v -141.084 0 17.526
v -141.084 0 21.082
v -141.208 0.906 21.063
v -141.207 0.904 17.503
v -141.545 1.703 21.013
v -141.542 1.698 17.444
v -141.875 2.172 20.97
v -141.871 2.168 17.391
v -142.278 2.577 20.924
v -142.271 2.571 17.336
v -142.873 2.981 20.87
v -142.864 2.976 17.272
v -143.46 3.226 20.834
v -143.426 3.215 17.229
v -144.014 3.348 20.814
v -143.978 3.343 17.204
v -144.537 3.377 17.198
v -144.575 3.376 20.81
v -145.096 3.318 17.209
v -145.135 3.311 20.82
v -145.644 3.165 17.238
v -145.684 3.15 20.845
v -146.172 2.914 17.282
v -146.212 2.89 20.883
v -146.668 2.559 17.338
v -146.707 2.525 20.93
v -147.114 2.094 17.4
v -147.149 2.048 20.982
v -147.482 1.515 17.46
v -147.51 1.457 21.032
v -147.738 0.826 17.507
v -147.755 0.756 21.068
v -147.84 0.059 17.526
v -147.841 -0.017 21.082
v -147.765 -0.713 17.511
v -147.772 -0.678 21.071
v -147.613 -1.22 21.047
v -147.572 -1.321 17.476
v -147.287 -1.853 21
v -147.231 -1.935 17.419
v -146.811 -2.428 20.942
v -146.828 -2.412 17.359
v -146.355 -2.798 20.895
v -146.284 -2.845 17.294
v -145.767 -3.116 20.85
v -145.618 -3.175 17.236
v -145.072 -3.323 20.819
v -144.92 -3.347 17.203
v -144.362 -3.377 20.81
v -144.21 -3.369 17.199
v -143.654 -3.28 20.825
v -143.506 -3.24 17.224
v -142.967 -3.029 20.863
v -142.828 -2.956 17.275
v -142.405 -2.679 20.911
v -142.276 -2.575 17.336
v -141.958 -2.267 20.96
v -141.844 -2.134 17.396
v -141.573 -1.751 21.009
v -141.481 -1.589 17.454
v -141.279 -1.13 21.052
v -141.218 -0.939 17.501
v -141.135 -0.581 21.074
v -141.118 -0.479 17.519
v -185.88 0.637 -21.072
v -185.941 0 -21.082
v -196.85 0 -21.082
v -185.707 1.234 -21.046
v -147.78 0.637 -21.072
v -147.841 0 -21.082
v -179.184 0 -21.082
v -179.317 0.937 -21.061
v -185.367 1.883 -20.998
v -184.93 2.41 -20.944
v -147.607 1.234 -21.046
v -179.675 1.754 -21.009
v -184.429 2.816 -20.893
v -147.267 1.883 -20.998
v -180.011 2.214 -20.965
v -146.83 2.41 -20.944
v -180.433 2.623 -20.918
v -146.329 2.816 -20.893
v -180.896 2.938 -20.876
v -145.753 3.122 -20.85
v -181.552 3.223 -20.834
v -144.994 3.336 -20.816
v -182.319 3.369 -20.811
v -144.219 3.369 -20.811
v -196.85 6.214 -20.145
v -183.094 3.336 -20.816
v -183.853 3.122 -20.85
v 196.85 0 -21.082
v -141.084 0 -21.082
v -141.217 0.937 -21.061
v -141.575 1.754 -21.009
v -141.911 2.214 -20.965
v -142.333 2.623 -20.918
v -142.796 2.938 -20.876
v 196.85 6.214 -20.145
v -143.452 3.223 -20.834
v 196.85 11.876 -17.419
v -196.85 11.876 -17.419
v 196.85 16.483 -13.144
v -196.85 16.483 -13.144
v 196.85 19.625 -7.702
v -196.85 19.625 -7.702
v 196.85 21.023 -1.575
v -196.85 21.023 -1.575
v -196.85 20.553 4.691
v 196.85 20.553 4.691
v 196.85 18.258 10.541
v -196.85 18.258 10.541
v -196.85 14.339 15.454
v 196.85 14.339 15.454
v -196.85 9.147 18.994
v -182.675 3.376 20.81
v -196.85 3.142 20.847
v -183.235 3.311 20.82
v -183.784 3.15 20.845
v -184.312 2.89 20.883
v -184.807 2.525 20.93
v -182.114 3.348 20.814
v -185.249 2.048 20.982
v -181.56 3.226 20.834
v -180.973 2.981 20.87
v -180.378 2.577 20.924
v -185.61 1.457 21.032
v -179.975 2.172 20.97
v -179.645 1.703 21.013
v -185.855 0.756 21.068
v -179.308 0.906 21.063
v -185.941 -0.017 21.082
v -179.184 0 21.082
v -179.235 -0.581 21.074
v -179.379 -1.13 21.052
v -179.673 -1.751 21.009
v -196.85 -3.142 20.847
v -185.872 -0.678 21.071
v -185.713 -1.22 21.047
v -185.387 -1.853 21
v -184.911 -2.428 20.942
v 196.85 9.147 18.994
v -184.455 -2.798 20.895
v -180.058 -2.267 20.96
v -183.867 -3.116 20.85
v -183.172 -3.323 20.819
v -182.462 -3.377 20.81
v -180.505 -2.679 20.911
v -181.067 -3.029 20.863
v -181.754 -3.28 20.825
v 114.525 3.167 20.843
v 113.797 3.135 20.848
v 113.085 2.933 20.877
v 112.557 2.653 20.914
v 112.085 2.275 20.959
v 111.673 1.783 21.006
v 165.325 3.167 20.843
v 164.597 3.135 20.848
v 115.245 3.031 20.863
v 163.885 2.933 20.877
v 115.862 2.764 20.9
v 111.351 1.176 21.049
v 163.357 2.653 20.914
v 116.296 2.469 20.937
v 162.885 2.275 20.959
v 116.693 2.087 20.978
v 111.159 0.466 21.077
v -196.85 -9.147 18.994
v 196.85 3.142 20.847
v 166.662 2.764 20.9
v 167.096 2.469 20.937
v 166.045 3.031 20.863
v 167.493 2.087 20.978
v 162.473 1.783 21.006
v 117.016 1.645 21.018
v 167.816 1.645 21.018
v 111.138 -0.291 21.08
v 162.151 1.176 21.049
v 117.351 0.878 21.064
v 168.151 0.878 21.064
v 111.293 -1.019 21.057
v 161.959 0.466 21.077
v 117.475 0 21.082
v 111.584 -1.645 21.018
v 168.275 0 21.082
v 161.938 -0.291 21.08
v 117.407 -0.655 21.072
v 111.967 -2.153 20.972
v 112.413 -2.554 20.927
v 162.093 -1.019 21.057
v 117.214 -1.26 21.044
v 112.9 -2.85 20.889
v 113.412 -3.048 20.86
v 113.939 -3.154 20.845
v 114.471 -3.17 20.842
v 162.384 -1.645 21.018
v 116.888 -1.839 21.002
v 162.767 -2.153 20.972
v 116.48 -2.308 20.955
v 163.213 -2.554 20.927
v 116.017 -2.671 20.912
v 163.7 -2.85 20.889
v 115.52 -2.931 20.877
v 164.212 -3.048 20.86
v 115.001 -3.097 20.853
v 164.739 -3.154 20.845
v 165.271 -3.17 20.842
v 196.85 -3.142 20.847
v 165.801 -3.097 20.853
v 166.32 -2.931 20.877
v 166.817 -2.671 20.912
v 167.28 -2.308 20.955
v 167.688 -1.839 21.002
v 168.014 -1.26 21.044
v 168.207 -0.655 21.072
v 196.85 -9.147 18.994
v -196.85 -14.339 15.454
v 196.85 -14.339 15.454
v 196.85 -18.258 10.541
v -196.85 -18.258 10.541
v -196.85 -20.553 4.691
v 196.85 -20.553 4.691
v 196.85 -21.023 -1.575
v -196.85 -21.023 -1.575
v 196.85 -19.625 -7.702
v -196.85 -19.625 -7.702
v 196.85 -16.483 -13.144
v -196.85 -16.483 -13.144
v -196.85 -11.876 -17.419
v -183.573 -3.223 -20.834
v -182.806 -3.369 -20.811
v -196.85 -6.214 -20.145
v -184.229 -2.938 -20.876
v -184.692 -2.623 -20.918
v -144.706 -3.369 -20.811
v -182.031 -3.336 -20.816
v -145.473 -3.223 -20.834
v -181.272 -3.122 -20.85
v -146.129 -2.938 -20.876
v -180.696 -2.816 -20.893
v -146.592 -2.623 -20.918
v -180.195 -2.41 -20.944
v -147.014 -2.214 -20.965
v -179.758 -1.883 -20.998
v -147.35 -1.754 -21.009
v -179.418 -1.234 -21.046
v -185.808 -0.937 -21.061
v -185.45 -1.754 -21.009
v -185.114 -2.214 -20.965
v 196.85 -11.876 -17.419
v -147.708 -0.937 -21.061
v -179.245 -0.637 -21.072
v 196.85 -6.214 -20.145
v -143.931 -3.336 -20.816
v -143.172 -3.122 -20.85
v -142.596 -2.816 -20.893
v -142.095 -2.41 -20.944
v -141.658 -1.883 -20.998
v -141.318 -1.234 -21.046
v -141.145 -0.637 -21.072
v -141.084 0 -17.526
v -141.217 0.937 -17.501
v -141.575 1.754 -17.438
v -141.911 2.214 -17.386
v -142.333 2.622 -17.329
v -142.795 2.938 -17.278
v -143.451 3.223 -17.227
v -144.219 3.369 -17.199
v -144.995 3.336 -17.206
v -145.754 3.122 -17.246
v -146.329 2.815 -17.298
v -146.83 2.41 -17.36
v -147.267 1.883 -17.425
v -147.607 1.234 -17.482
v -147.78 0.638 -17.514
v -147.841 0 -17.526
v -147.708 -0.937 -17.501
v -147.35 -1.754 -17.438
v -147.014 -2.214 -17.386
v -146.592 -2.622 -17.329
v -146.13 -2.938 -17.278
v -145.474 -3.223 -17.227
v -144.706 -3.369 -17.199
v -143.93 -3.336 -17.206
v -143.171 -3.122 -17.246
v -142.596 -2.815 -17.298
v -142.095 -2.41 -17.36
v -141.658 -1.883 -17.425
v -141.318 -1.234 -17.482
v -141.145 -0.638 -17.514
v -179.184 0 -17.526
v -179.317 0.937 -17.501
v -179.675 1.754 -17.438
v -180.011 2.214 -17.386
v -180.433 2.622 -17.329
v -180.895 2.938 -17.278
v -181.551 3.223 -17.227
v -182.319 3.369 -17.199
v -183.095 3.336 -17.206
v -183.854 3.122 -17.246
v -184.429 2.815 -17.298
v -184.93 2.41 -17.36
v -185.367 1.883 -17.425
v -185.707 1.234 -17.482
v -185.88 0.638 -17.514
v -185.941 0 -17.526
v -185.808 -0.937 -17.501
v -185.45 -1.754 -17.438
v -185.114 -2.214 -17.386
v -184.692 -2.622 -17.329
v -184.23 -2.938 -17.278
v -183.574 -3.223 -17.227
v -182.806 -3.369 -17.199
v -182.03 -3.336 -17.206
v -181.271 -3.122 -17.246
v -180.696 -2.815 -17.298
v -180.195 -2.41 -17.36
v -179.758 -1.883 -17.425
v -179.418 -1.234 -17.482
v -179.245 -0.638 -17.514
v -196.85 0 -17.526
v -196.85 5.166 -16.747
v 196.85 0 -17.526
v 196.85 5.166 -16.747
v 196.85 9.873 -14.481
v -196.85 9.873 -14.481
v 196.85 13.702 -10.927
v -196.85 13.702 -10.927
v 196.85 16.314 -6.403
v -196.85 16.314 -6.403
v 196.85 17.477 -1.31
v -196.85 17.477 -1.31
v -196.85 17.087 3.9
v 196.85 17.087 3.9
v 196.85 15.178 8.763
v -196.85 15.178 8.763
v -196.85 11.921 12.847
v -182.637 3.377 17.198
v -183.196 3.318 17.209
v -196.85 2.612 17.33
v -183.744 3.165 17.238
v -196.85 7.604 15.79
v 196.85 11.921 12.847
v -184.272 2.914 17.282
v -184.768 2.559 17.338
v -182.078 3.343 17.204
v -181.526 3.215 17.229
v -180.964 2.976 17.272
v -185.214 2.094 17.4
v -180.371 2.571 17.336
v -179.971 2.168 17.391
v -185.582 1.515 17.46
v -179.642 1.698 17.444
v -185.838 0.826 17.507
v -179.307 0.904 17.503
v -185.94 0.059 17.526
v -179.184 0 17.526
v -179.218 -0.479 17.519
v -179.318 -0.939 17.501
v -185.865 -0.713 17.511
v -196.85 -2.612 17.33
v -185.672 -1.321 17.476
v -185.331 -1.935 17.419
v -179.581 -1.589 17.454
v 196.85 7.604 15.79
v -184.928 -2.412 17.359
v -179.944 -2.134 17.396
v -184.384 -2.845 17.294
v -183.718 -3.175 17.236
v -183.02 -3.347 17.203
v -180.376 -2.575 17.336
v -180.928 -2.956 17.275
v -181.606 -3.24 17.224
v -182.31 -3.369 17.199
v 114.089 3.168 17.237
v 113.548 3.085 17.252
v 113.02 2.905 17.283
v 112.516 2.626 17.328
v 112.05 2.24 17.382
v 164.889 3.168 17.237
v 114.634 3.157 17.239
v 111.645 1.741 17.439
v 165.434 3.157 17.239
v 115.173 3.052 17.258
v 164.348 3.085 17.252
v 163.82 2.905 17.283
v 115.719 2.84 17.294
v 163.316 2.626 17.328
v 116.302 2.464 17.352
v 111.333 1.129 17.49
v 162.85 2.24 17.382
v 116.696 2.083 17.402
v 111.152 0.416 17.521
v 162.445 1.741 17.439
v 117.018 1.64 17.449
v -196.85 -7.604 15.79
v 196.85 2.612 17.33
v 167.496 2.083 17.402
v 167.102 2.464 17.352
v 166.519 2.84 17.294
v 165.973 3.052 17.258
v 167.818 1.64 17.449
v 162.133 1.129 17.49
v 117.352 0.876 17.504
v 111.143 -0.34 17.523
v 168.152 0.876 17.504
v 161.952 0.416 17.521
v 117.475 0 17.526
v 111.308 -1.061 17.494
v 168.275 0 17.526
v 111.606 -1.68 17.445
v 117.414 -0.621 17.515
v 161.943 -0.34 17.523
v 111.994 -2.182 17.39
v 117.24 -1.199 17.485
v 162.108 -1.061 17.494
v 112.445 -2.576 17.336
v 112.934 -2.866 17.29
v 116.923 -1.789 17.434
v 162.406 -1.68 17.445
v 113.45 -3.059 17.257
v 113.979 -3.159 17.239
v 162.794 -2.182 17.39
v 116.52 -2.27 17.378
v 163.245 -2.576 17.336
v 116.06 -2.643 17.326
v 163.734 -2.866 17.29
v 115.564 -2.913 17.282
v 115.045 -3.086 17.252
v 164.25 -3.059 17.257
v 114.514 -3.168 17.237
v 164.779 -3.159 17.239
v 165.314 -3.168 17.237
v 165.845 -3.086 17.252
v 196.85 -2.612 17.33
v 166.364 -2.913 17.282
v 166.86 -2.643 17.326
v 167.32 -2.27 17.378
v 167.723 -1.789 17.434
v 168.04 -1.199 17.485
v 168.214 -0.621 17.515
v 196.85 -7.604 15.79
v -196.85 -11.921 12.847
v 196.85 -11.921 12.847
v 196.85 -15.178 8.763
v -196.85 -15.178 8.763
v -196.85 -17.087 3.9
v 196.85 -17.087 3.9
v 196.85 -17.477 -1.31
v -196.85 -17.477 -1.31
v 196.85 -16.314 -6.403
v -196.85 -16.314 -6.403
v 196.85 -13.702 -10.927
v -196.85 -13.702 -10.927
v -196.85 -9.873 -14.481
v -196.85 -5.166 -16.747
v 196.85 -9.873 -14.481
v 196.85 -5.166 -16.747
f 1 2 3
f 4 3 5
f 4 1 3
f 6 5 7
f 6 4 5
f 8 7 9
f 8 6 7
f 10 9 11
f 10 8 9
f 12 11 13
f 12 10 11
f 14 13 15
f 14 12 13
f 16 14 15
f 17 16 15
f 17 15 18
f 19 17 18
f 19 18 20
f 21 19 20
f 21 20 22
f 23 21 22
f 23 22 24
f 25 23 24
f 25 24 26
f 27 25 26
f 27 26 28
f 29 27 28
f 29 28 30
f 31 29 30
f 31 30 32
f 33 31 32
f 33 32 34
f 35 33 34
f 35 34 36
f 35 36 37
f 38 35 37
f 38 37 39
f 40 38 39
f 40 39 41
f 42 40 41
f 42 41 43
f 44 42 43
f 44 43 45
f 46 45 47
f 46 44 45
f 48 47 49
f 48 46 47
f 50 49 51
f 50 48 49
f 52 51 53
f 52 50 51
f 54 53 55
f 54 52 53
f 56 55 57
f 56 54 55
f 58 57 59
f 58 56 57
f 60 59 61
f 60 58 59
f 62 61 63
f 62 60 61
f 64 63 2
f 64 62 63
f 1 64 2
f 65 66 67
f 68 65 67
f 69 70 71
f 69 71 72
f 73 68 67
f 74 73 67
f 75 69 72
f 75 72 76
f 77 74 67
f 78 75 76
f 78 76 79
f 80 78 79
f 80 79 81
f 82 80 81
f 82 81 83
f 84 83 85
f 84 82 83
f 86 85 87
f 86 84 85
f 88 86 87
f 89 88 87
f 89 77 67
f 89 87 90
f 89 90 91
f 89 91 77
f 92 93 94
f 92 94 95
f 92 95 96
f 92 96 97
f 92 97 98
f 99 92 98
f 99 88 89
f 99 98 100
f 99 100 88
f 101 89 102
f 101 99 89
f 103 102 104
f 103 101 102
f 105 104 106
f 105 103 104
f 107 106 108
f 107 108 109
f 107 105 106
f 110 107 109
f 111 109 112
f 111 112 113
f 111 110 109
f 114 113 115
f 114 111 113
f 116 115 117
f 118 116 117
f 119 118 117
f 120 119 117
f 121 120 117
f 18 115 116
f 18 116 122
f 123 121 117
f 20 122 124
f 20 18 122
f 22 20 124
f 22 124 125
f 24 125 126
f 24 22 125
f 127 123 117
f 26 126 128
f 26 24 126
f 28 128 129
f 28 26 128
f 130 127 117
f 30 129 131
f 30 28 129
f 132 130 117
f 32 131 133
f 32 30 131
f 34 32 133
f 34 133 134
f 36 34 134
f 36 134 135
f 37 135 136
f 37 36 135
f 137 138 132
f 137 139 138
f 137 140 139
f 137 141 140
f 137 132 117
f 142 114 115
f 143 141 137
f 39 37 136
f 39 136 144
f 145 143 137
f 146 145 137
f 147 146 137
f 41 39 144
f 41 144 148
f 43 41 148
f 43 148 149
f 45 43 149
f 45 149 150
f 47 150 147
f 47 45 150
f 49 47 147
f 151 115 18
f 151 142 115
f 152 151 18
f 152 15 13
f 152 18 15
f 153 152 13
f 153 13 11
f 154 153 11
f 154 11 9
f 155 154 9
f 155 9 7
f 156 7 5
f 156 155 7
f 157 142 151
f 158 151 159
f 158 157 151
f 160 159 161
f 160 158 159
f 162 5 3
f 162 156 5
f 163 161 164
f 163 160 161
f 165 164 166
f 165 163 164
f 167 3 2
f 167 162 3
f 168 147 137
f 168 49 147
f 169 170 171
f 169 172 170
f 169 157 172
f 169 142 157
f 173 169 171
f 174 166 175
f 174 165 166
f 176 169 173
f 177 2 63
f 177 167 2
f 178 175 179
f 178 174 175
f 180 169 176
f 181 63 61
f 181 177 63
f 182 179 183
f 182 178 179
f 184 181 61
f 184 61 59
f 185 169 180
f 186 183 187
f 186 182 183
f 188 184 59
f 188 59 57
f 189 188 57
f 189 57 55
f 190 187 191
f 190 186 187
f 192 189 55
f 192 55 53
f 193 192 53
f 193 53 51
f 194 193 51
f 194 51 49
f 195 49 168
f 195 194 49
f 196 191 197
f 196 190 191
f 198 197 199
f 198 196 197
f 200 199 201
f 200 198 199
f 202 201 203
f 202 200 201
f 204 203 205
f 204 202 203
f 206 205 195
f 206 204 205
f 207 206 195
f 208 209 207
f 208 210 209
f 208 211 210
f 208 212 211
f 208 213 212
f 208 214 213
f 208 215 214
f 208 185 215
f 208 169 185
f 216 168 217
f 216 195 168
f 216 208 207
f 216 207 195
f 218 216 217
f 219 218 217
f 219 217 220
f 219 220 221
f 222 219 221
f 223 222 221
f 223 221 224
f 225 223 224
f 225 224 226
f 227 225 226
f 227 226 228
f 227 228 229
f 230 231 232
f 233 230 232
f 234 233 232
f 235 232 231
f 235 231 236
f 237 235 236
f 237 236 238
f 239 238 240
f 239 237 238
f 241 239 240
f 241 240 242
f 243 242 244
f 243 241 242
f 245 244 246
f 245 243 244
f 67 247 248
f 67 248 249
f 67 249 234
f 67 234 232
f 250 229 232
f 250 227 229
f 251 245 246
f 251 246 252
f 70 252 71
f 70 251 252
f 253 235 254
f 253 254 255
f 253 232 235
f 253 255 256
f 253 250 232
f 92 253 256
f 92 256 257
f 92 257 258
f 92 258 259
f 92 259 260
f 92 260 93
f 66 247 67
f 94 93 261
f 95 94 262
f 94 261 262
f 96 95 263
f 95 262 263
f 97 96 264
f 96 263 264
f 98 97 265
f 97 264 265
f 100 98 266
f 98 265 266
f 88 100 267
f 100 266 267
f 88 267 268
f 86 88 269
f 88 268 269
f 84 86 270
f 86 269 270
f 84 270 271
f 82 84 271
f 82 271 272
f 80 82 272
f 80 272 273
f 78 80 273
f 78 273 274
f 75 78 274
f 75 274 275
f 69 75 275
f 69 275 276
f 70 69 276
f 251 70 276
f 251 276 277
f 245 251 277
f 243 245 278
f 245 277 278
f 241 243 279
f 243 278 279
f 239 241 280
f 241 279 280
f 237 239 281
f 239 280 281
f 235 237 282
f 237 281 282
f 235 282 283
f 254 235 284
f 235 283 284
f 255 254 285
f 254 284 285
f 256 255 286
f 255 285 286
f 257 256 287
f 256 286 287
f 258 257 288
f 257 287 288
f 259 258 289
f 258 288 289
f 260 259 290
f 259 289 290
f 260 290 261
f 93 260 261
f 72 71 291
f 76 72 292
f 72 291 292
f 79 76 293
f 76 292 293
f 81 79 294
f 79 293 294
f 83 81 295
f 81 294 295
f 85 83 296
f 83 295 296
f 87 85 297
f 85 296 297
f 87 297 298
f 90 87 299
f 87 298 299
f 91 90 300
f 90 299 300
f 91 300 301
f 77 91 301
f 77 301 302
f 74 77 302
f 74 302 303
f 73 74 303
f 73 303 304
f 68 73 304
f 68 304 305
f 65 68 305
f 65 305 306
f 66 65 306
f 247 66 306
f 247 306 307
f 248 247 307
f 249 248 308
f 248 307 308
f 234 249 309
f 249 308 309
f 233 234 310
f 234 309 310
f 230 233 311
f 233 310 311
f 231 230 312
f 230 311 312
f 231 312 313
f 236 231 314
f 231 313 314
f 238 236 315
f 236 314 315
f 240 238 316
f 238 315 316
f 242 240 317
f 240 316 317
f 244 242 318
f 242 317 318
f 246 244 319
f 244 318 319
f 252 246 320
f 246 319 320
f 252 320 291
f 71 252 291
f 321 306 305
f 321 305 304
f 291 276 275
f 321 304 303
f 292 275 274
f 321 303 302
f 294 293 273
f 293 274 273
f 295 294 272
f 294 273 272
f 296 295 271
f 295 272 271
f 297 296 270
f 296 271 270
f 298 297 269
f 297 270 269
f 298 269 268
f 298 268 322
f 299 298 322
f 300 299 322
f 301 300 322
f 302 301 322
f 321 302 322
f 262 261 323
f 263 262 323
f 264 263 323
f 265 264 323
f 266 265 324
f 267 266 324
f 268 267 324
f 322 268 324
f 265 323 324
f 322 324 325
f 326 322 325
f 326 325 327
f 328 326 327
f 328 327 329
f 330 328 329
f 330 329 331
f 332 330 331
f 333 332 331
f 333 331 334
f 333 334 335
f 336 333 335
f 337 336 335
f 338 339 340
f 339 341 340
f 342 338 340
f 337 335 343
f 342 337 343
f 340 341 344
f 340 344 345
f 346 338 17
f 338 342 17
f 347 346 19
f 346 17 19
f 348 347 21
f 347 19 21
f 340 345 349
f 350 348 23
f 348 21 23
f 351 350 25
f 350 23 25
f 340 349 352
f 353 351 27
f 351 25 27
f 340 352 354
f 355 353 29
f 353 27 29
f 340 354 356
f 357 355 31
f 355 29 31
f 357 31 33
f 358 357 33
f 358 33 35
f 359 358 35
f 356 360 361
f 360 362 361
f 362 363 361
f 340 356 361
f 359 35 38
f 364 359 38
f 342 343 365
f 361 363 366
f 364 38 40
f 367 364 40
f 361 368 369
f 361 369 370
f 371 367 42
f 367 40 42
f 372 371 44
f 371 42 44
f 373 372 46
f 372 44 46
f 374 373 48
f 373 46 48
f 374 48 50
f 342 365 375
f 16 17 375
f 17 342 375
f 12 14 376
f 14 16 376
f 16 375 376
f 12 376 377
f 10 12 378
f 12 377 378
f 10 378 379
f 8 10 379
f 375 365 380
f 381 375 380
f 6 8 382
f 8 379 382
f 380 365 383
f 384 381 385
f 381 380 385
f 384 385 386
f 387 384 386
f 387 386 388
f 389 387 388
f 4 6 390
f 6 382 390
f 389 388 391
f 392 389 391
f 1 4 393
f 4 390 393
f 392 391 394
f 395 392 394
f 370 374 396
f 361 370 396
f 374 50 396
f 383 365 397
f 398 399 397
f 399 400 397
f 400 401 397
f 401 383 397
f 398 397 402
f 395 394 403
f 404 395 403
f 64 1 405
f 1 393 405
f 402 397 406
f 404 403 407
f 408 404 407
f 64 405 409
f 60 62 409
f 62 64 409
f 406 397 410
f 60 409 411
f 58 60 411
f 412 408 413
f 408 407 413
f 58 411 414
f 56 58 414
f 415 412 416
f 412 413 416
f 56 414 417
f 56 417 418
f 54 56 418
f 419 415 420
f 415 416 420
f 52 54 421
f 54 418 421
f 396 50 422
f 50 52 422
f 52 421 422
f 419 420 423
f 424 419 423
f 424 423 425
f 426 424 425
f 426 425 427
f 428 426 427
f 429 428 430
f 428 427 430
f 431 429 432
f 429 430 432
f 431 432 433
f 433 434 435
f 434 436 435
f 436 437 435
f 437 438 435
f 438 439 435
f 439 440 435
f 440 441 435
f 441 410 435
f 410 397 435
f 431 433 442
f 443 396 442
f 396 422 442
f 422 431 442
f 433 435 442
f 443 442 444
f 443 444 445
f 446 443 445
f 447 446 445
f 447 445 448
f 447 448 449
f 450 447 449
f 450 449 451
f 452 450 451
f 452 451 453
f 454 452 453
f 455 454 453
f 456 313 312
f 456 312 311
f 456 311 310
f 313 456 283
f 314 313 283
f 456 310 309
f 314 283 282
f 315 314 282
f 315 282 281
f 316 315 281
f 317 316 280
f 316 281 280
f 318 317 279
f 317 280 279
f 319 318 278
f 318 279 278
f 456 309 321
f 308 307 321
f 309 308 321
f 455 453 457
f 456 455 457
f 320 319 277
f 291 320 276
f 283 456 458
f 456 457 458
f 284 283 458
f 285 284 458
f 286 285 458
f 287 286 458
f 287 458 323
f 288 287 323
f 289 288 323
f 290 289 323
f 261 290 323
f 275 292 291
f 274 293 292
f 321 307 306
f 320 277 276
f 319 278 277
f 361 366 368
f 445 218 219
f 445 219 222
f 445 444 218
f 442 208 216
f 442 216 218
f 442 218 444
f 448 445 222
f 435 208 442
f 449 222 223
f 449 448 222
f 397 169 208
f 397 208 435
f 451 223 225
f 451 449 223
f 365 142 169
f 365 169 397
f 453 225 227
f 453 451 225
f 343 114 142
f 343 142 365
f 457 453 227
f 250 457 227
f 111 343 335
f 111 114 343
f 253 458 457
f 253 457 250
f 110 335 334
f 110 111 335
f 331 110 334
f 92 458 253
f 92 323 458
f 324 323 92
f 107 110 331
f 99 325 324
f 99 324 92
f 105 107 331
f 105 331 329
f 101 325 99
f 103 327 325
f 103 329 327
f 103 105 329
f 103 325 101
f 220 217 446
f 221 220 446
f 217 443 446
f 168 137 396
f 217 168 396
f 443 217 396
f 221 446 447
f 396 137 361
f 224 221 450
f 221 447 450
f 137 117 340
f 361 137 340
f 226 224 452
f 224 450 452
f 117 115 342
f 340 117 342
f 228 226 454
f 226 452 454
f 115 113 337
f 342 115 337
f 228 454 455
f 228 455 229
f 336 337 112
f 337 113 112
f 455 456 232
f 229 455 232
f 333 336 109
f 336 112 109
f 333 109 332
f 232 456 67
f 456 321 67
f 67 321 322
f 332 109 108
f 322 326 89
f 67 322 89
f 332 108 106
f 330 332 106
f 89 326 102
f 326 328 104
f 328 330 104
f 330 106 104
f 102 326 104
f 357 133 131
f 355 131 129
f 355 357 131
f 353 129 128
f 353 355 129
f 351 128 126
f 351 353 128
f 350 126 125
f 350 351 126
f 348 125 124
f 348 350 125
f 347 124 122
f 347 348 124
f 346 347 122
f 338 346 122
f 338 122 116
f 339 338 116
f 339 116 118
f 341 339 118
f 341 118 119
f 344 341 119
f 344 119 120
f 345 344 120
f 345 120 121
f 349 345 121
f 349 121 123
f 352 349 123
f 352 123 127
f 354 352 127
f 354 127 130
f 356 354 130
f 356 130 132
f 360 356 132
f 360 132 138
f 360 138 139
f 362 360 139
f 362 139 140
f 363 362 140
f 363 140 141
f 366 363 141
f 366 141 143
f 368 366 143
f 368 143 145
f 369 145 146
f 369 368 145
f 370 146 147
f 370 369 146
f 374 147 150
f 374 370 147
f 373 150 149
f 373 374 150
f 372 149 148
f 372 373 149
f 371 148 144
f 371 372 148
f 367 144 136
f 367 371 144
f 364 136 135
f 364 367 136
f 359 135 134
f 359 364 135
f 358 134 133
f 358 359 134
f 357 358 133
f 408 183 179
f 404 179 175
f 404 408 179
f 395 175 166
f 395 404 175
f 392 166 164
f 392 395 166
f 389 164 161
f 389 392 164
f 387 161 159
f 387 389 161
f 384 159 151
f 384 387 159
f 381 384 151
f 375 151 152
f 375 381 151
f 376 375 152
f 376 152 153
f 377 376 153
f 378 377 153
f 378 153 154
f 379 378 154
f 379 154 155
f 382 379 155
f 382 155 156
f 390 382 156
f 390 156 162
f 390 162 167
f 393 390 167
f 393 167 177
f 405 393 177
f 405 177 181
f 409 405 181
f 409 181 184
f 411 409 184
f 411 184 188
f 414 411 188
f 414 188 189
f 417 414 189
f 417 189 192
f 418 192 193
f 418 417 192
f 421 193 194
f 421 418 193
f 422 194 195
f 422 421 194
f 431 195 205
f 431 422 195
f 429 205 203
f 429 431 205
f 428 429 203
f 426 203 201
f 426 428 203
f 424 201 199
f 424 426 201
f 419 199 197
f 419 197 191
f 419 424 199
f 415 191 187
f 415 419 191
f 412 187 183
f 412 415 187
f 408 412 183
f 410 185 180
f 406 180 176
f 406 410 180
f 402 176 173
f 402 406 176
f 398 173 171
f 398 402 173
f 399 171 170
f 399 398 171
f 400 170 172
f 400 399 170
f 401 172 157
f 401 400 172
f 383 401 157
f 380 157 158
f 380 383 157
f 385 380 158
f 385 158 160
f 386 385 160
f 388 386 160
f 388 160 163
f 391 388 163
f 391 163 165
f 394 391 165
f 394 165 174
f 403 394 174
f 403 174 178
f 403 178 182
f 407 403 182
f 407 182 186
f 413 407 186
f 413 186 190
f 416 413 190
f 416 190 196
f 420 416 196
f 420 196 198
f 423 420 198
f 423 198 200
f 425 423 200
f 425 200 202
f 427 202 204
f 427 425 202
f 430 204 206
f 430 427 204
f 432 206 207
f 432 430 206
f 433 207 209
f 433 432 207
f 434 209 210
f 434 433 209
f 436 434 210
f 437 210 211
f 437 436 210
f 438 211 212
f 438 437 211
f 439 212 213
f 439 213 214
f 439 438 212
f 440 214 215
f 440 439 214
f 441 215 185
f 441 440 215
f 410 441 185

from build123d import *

# Parameters (mm, degrees)
SKETCH1_R                = 21.082
SKETCH1_R_2              = 17.526
BOSS_EXTRUDE1_DEPTH      = 196.85
BOSS_EXTRUDE1_DEPTH_BACK = 196.85
SKETCH2_R                = 3.3782
CUT_EXTRUDE1_DEPTH       = 22.082
CUT_EXTRUDE1_DEPTH_BACK  = 22.082
SKETCH3_R                = 3.175
CUT_EXTRUDE2_DEPTH       = 22.0820001


with BuildPart() as part:
    # Sketch1 → Boss-Extrude1 (new body, two sides)
    with BuildSketch(Plane(origin=(0, 0, 0), x_dir=(0, 0, -1), z_dir=(1, 0, 0))) as boss_extrude1_sk:
        Circle(SKETCH1_R)
        Circle(SKETCH1_R_2, mode=Mode.SUBTRACT)
    extrude(amount=BOSS_EXTRUDE1_DEPTH)
    extrude(boss_extrude1_sk.sketch, amount=-BOSS_EXTRUDE1_DEPTH_BACK)

    # Sketch2 → Cut-Extrude1 (cut, two sides)
    with BuildSketch(Plane.XY) as cut_extrude1_sk:
        with Locations((-144.4625, 0)):
            Circle(SKETCH2_R)
        with Locations((-182.5625, 0)):
            Circle(SKETCH2_R)
    extrude(amount=CUT_EXTRUDE1_DEPTH, mode=Mode.SUBTRACT)
    extrude(cut_extrude1_sk.sketch, amount=-CUT_EXTRUDE1_DEPTH_BACK, mode=Mode.SUBTRACT)

    # Sketch3 → Cut-Extrude2 (cut, through all)
    with BuildSketch(Plane.XY):
        with Locations((165.1, 0)):
            Circle(SKETCH3_R)
        with Locations((114.3, 0)):
            Circle(SKETCH3_R)
    extrude(amount=CUT_EXTRUDE2_DEPTH, mode=Mode.SUBTRACT)


solid = part.part
